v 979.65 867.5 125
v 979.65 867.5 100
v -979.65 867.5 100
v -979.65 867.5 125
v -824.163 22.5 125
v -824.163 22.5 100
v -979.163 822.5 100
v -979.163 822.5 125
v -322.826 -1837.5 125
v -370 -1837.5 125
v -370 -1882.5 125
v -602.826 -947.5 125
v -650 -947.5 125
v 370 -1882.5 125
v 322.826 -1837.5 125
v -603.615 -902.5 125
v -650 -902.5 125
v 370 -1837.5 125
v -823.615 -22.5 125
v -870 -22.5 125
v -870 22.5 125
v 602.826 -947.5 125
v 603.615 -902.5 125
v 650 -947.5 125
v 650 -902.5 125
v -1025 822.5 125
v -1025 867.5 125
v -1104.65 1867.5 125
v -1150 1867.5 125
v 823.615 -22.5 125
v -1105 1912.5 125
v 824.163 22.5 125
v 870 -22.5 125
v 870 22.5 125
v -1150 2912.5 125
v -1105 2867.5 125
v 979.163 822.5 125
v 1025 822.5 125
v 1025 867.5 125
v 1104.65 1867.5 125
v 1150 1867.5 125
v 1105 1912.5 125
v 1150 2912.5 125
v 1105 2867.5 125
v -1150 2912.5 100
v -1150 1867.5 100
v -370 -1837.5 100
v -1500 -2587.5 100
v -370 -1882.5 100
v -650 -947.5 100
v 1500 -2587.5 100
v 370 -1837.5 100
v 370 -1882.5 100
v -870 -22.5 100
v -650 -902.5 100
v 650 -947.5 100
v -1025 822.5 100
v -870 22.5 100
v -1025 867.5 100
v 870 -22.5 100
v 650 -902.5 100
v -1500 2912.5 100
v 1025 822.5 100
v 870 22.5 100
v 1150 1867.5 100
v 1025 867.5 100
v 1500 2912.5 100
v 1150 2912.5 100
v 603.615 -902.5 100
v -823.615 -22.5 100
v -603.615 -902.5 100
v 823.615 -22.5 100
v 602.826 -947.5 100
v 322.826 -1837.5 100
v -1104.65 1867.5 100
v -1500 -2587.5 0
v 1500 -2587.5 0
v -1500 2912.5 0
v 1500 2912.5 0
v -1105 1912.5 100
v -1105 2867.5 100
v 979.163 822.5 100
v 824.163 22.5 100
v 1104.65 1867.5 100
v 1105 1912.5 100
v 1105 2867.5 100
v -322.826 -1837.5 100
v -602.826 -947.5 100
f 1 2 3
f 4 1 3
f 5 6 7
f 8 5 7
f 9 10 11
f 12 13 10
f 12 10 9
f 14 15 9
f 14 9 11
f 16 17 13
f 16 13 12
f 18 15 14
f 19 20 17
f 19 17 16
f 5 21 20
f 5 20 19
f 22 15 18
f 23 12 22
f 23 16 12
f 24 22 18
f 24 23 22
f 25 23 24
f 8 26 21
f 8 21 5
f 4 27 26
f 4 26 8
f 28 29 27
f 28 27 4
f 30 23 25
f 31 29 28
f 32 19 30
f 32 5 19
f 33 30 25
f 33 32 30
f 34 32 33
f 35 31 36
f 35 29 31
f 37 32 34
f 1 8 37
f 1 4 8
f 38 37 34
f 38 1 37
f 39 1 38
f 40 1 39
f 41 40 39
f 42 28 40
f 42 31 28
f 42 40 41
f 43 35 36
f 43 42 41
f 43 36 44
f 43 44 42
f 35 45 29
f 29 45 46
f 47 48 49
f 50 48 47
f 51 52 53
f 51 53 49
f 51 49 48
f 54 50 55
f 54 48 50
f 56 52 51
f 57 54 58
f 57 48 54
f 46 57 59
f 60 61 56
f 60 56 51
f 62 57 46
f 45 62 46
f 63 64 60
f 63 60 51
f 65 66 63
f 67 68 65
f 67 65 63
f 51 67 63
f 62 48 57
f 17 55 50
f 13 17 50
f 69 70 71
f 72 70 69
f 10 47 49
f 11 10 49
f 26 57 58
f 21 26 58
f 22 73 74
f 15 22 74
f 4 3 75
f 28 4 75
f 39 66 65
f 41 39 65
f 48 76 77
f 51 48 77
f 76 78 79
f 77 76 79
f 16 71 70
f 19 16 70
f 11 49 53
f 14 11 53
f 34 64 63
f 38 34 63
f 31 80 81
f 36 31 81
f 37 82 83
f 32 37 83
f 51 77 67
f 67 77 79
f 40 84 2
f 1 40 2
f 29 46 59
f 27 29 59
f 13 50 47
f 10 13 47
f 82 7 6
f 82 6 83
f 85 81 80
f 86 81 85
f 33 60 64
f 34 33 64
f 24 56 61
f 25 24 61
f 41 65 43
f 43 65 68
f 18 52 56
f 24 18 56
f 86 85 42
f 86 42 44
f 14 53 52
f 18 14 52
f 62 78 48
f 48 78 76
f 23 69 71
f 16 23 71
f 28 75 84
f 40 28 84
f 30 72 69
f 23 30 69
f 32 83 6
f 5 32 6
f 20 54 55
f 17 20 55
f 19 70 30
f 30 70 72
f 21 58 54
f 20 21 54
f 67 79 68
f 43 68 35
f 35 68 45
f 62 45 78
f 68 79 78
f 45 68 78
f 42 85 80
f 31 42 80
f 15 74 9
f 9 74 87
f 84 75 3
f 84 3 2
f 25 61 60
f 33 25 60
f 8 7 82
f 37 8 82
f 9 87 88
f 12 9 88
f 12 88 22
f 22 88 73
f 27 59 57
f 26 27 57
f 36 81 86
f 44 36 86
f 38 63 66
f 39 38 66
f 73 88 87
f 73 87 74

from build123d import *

# Parameters (mm, degrees)
F0_W     = 2210
F0_H     = 955
F0_W_2   = 45
F1_DEPTH = 100
F2_DEPTH = 125
F3_DEPTH = 125


# Not quite as in the source:
# - a feature names something its author has since deleted; it is built from what else it names


with BuildPart() as f1:
    # F0 (on Top) → F1 (new body)
    with BuildSketch(Plane.XY):
        Polygon((1500, -1587.5), (1500, 2912.5), (1150, 2912.5), (1150, 2867.5), (1150, 1912.5), (1150, 1867.5), (1025, 867.5), (1025, 822.5), (870, 22.5), (870, -22.5), (650, -902.5), (650, -947.5), (370, -1837.5), (370, -1882.5), (-370, -1882.5), (-370, -1837.5), (-650, -947.5), (-650, -902.5), (-870, -22.5), (-870, 22.5), (-1025, 822.5), (-1025, 867.5), (-1150, 1867.5), (-1150, 1912.5), (-1150, 2867.5), (-1150, 2912.5), (-1500, 2912.5), (-1500, -1587.5), (-1500, -2587.5), (1500, -2587.5), align=None)
        Polygon((322.8255446377, -1837.5), (602.8255446377, -947.5), (-602.8255446377, -947.5), (-322.8255446377, -1837.5), align=None)
        Polygon((-602.8255446377, -947.5), (-650, -947.5), (-370, -1837.5), (-322.8255446377, -1837.5), align=None)
        Polygon((370, -1837.5), (650, -947.5), (602.8255446377, -947.5), (322.8255446377, -1837.5), align=None)
        Polygon((603.6150617118, -902.5), (823.6150617118, -22.5), (-823.6150617118, -22.5), (-603.6150617118, -902.5), align=None)
        Polygon((-823.6150617118, -22.5), (-870, -22.5), (-650, -902.5), (-603.6150617118, -902.5), align=None)
        Polygon((870, -22.5), (870, 22.5), (824.1631523601, 22.5), (-824.1631523601, 22.5), (-870, 22.5), (-870, -22.5), (-823.6150617118, -22.5), (823.6150617118, -22.5), align=None)
        Polygon((650, -902.5), (870, -22.5), (823.6150617118, -22.5), (603.6150617118, -902.5), align=None)
        Polygon((870, 22.5), (1025, 822.5), (979.1631523601, 822.5), (824.1631523601, 22.5), align=None)
        Polygon((824.1631523601, 22.5), (979.1631523601, 822.5), (-979.1631523601, 822.5), (-824.1631523601, 22.5), align=None)
        Polygon((-979.1631523601, 822.5), (-1025, 822.5), (-870, 22.5), (-824.1631523601, 22.5), align=None)
        Polygon((1025, 822.5), (1025, 867.5), (979.6498001658, 867.5), (-979.6498001658, 867.5), (-1025, 867.5), (-1025, 822.5), (-979.1631523601, 822.5), (979.1631523601, 822.5), align=None)
        Polygon((979.6498001658, 867.5), (1104.6498001658, 1867.5), (-1104.6498001658, 1867.5), (-979.6498001658, 867.5), align=None)
        Polygon((1025, 867.5), (1150, 1867.5), (1104.6498001658, 1867.5), (979.6498001658, 867.5), align=None)
        Polygon((1150, 1867.5), (1150, 1912.5), (1105, 1912.5), (-1105, 1912.5), (-1150, 1912.5), (-1150, 1867.5), (-1104.6498001658, 1867.5), (1104.6498001658, 1867.5), align=None)
        Polygon((-1104.6498001658, 1867.5), (-1150, 1867.5), (-1025, 867.5), (-979.6498001658, 867.5), align=None)
        with Locations((0, 2390)):
            Rectangle(F0_W, F0_H)
        with Locations((1127.5, 2390)):
            Rectangle(F0_W_2, F0_H)
        Polygon((1150, 2867.5), (1150, 2912.5), (-1150, 2912.5), (-1150, 2867.5), (-1105, 2867.5), (1105, 2867.5), align=None)
        with Locations((-1127.5, 2390)):
            Rectangle(F0_W_2, F0_H)
        Polygon((650, -947.5), (650, -902.5), (603.6150617118, -902.5), (-603.6150617118, -902.5), (-650, -902.5), (-650, -947.5), (-602.8255446377, -947.5), (602.8255446377, -947.5), align=None)
        Polygon((370, -1882.5), (370, -1837.5), (322.8255446377, -1837.5), (-322.8255446377, -1837.5), (-370, -1837.5), (-370, -1882.5), align=None)
    extrude(amount=F1_DEPTH)

    # F0 (on Top) → F2 (join)
    with BuildSketch(Plane.XY):
        Polygon((1150, 1867.5), (1150, 1912.5), (1105, 1912.5), (-1105, 1912.5), (-1150, 1912.5), (-1150, 1867.5), (-1104.6498001658, 1867.5), (1104.6498001658, 1867.5), align=None)
        Polygon((1025, 822.5), (1025, 867.5), (979.6498001658, 867.5), (-979.6498001658, 867.5), (-1025, 867.5), (-1025, 822.5), (-979.1631523601, 822.5), (979.1631523601, 822.5), align=None)
        Polygon((870, -22.5), (870, 22.5), (824.1631523601, 22.5), (-824.1631523601, 22.5), (-870, 22.5), (-870, -22.5), (-823.6150617118, -22.5), (823.6150617118, -22.5), align=None)
        Polygon((650, -947.5), (650, -902.5), (603.6150617118, -902.5), (-603.6150617118, -902.5), (-650, -902.5), (-650, -947.5), (-602.8255446377, -947.5), (602.8255446377, -947.5), align=None)
        Polygon((370, -1882.5), (370, -1837.5), (322.8255446377, -1837.5), (-322.8255446377, -1837.5), (-370, -1837.5), (-370, -1882.5), align=None)
        Polygon((1150, 2867.5), (1150, 2912.5), (-1150, 2912.5), (-1150, 2867.5), (-1105, 2867.5), (1105, 2867.5), align=None)
    extrude(amount=F2_DEPTH)

    # F0 (on Top) → F3 (join)
    with BuildSketch(Plane.XY):
        Polygon((-602.8255446377, -947.5), (-650, -947.5), (-370, -1837.5), (-322.8255446377, -1837.5), align=None)
        Polygon((370, -1837.5), (650, -947.5), (602.8255446377, -947.5), (322.8255446377, -1837.5), align=None)
        Polygon((-823.6150617118, -22.5), (-870, -22.5), (-650, -902.5), (-603.6150617118, -902.5), align=None)
        Polygon((650, -902.5), (870, -22.5), (823.6150617118, -22.5), (603.6150617118, -902.5), align=None)
        Polygon((870, 22.5), (1025, 822.5), (979.1631523601, 822.5), (824.1631523601, 22.5), align=None)
        Polygon((-979.1631523601, 822.5), (-1025, 822.5), (-870, 22.5), (-824.1631523601, 22.5), align=None)
        Polygon((1025, 867.5), (1150, 1867.5), (1104.6498001658, 1867.5), (979.6498001658, 867.5), align=None)
        with Locations((1127.5, 2390)):
            Rectangle(F0_W_2, F0_H)
        with Locations((-1127.5, 2390)):
            Rectangle(F0_W_2, F0_H)
        Polygon((-1104.6498001658, 1867.5), (-1150, 1867.5), (-1025, 867.5), (-979.6498001658, 867.5), align=None)
    extrude(amount=F3_DEPTH)


solid = f1.part
